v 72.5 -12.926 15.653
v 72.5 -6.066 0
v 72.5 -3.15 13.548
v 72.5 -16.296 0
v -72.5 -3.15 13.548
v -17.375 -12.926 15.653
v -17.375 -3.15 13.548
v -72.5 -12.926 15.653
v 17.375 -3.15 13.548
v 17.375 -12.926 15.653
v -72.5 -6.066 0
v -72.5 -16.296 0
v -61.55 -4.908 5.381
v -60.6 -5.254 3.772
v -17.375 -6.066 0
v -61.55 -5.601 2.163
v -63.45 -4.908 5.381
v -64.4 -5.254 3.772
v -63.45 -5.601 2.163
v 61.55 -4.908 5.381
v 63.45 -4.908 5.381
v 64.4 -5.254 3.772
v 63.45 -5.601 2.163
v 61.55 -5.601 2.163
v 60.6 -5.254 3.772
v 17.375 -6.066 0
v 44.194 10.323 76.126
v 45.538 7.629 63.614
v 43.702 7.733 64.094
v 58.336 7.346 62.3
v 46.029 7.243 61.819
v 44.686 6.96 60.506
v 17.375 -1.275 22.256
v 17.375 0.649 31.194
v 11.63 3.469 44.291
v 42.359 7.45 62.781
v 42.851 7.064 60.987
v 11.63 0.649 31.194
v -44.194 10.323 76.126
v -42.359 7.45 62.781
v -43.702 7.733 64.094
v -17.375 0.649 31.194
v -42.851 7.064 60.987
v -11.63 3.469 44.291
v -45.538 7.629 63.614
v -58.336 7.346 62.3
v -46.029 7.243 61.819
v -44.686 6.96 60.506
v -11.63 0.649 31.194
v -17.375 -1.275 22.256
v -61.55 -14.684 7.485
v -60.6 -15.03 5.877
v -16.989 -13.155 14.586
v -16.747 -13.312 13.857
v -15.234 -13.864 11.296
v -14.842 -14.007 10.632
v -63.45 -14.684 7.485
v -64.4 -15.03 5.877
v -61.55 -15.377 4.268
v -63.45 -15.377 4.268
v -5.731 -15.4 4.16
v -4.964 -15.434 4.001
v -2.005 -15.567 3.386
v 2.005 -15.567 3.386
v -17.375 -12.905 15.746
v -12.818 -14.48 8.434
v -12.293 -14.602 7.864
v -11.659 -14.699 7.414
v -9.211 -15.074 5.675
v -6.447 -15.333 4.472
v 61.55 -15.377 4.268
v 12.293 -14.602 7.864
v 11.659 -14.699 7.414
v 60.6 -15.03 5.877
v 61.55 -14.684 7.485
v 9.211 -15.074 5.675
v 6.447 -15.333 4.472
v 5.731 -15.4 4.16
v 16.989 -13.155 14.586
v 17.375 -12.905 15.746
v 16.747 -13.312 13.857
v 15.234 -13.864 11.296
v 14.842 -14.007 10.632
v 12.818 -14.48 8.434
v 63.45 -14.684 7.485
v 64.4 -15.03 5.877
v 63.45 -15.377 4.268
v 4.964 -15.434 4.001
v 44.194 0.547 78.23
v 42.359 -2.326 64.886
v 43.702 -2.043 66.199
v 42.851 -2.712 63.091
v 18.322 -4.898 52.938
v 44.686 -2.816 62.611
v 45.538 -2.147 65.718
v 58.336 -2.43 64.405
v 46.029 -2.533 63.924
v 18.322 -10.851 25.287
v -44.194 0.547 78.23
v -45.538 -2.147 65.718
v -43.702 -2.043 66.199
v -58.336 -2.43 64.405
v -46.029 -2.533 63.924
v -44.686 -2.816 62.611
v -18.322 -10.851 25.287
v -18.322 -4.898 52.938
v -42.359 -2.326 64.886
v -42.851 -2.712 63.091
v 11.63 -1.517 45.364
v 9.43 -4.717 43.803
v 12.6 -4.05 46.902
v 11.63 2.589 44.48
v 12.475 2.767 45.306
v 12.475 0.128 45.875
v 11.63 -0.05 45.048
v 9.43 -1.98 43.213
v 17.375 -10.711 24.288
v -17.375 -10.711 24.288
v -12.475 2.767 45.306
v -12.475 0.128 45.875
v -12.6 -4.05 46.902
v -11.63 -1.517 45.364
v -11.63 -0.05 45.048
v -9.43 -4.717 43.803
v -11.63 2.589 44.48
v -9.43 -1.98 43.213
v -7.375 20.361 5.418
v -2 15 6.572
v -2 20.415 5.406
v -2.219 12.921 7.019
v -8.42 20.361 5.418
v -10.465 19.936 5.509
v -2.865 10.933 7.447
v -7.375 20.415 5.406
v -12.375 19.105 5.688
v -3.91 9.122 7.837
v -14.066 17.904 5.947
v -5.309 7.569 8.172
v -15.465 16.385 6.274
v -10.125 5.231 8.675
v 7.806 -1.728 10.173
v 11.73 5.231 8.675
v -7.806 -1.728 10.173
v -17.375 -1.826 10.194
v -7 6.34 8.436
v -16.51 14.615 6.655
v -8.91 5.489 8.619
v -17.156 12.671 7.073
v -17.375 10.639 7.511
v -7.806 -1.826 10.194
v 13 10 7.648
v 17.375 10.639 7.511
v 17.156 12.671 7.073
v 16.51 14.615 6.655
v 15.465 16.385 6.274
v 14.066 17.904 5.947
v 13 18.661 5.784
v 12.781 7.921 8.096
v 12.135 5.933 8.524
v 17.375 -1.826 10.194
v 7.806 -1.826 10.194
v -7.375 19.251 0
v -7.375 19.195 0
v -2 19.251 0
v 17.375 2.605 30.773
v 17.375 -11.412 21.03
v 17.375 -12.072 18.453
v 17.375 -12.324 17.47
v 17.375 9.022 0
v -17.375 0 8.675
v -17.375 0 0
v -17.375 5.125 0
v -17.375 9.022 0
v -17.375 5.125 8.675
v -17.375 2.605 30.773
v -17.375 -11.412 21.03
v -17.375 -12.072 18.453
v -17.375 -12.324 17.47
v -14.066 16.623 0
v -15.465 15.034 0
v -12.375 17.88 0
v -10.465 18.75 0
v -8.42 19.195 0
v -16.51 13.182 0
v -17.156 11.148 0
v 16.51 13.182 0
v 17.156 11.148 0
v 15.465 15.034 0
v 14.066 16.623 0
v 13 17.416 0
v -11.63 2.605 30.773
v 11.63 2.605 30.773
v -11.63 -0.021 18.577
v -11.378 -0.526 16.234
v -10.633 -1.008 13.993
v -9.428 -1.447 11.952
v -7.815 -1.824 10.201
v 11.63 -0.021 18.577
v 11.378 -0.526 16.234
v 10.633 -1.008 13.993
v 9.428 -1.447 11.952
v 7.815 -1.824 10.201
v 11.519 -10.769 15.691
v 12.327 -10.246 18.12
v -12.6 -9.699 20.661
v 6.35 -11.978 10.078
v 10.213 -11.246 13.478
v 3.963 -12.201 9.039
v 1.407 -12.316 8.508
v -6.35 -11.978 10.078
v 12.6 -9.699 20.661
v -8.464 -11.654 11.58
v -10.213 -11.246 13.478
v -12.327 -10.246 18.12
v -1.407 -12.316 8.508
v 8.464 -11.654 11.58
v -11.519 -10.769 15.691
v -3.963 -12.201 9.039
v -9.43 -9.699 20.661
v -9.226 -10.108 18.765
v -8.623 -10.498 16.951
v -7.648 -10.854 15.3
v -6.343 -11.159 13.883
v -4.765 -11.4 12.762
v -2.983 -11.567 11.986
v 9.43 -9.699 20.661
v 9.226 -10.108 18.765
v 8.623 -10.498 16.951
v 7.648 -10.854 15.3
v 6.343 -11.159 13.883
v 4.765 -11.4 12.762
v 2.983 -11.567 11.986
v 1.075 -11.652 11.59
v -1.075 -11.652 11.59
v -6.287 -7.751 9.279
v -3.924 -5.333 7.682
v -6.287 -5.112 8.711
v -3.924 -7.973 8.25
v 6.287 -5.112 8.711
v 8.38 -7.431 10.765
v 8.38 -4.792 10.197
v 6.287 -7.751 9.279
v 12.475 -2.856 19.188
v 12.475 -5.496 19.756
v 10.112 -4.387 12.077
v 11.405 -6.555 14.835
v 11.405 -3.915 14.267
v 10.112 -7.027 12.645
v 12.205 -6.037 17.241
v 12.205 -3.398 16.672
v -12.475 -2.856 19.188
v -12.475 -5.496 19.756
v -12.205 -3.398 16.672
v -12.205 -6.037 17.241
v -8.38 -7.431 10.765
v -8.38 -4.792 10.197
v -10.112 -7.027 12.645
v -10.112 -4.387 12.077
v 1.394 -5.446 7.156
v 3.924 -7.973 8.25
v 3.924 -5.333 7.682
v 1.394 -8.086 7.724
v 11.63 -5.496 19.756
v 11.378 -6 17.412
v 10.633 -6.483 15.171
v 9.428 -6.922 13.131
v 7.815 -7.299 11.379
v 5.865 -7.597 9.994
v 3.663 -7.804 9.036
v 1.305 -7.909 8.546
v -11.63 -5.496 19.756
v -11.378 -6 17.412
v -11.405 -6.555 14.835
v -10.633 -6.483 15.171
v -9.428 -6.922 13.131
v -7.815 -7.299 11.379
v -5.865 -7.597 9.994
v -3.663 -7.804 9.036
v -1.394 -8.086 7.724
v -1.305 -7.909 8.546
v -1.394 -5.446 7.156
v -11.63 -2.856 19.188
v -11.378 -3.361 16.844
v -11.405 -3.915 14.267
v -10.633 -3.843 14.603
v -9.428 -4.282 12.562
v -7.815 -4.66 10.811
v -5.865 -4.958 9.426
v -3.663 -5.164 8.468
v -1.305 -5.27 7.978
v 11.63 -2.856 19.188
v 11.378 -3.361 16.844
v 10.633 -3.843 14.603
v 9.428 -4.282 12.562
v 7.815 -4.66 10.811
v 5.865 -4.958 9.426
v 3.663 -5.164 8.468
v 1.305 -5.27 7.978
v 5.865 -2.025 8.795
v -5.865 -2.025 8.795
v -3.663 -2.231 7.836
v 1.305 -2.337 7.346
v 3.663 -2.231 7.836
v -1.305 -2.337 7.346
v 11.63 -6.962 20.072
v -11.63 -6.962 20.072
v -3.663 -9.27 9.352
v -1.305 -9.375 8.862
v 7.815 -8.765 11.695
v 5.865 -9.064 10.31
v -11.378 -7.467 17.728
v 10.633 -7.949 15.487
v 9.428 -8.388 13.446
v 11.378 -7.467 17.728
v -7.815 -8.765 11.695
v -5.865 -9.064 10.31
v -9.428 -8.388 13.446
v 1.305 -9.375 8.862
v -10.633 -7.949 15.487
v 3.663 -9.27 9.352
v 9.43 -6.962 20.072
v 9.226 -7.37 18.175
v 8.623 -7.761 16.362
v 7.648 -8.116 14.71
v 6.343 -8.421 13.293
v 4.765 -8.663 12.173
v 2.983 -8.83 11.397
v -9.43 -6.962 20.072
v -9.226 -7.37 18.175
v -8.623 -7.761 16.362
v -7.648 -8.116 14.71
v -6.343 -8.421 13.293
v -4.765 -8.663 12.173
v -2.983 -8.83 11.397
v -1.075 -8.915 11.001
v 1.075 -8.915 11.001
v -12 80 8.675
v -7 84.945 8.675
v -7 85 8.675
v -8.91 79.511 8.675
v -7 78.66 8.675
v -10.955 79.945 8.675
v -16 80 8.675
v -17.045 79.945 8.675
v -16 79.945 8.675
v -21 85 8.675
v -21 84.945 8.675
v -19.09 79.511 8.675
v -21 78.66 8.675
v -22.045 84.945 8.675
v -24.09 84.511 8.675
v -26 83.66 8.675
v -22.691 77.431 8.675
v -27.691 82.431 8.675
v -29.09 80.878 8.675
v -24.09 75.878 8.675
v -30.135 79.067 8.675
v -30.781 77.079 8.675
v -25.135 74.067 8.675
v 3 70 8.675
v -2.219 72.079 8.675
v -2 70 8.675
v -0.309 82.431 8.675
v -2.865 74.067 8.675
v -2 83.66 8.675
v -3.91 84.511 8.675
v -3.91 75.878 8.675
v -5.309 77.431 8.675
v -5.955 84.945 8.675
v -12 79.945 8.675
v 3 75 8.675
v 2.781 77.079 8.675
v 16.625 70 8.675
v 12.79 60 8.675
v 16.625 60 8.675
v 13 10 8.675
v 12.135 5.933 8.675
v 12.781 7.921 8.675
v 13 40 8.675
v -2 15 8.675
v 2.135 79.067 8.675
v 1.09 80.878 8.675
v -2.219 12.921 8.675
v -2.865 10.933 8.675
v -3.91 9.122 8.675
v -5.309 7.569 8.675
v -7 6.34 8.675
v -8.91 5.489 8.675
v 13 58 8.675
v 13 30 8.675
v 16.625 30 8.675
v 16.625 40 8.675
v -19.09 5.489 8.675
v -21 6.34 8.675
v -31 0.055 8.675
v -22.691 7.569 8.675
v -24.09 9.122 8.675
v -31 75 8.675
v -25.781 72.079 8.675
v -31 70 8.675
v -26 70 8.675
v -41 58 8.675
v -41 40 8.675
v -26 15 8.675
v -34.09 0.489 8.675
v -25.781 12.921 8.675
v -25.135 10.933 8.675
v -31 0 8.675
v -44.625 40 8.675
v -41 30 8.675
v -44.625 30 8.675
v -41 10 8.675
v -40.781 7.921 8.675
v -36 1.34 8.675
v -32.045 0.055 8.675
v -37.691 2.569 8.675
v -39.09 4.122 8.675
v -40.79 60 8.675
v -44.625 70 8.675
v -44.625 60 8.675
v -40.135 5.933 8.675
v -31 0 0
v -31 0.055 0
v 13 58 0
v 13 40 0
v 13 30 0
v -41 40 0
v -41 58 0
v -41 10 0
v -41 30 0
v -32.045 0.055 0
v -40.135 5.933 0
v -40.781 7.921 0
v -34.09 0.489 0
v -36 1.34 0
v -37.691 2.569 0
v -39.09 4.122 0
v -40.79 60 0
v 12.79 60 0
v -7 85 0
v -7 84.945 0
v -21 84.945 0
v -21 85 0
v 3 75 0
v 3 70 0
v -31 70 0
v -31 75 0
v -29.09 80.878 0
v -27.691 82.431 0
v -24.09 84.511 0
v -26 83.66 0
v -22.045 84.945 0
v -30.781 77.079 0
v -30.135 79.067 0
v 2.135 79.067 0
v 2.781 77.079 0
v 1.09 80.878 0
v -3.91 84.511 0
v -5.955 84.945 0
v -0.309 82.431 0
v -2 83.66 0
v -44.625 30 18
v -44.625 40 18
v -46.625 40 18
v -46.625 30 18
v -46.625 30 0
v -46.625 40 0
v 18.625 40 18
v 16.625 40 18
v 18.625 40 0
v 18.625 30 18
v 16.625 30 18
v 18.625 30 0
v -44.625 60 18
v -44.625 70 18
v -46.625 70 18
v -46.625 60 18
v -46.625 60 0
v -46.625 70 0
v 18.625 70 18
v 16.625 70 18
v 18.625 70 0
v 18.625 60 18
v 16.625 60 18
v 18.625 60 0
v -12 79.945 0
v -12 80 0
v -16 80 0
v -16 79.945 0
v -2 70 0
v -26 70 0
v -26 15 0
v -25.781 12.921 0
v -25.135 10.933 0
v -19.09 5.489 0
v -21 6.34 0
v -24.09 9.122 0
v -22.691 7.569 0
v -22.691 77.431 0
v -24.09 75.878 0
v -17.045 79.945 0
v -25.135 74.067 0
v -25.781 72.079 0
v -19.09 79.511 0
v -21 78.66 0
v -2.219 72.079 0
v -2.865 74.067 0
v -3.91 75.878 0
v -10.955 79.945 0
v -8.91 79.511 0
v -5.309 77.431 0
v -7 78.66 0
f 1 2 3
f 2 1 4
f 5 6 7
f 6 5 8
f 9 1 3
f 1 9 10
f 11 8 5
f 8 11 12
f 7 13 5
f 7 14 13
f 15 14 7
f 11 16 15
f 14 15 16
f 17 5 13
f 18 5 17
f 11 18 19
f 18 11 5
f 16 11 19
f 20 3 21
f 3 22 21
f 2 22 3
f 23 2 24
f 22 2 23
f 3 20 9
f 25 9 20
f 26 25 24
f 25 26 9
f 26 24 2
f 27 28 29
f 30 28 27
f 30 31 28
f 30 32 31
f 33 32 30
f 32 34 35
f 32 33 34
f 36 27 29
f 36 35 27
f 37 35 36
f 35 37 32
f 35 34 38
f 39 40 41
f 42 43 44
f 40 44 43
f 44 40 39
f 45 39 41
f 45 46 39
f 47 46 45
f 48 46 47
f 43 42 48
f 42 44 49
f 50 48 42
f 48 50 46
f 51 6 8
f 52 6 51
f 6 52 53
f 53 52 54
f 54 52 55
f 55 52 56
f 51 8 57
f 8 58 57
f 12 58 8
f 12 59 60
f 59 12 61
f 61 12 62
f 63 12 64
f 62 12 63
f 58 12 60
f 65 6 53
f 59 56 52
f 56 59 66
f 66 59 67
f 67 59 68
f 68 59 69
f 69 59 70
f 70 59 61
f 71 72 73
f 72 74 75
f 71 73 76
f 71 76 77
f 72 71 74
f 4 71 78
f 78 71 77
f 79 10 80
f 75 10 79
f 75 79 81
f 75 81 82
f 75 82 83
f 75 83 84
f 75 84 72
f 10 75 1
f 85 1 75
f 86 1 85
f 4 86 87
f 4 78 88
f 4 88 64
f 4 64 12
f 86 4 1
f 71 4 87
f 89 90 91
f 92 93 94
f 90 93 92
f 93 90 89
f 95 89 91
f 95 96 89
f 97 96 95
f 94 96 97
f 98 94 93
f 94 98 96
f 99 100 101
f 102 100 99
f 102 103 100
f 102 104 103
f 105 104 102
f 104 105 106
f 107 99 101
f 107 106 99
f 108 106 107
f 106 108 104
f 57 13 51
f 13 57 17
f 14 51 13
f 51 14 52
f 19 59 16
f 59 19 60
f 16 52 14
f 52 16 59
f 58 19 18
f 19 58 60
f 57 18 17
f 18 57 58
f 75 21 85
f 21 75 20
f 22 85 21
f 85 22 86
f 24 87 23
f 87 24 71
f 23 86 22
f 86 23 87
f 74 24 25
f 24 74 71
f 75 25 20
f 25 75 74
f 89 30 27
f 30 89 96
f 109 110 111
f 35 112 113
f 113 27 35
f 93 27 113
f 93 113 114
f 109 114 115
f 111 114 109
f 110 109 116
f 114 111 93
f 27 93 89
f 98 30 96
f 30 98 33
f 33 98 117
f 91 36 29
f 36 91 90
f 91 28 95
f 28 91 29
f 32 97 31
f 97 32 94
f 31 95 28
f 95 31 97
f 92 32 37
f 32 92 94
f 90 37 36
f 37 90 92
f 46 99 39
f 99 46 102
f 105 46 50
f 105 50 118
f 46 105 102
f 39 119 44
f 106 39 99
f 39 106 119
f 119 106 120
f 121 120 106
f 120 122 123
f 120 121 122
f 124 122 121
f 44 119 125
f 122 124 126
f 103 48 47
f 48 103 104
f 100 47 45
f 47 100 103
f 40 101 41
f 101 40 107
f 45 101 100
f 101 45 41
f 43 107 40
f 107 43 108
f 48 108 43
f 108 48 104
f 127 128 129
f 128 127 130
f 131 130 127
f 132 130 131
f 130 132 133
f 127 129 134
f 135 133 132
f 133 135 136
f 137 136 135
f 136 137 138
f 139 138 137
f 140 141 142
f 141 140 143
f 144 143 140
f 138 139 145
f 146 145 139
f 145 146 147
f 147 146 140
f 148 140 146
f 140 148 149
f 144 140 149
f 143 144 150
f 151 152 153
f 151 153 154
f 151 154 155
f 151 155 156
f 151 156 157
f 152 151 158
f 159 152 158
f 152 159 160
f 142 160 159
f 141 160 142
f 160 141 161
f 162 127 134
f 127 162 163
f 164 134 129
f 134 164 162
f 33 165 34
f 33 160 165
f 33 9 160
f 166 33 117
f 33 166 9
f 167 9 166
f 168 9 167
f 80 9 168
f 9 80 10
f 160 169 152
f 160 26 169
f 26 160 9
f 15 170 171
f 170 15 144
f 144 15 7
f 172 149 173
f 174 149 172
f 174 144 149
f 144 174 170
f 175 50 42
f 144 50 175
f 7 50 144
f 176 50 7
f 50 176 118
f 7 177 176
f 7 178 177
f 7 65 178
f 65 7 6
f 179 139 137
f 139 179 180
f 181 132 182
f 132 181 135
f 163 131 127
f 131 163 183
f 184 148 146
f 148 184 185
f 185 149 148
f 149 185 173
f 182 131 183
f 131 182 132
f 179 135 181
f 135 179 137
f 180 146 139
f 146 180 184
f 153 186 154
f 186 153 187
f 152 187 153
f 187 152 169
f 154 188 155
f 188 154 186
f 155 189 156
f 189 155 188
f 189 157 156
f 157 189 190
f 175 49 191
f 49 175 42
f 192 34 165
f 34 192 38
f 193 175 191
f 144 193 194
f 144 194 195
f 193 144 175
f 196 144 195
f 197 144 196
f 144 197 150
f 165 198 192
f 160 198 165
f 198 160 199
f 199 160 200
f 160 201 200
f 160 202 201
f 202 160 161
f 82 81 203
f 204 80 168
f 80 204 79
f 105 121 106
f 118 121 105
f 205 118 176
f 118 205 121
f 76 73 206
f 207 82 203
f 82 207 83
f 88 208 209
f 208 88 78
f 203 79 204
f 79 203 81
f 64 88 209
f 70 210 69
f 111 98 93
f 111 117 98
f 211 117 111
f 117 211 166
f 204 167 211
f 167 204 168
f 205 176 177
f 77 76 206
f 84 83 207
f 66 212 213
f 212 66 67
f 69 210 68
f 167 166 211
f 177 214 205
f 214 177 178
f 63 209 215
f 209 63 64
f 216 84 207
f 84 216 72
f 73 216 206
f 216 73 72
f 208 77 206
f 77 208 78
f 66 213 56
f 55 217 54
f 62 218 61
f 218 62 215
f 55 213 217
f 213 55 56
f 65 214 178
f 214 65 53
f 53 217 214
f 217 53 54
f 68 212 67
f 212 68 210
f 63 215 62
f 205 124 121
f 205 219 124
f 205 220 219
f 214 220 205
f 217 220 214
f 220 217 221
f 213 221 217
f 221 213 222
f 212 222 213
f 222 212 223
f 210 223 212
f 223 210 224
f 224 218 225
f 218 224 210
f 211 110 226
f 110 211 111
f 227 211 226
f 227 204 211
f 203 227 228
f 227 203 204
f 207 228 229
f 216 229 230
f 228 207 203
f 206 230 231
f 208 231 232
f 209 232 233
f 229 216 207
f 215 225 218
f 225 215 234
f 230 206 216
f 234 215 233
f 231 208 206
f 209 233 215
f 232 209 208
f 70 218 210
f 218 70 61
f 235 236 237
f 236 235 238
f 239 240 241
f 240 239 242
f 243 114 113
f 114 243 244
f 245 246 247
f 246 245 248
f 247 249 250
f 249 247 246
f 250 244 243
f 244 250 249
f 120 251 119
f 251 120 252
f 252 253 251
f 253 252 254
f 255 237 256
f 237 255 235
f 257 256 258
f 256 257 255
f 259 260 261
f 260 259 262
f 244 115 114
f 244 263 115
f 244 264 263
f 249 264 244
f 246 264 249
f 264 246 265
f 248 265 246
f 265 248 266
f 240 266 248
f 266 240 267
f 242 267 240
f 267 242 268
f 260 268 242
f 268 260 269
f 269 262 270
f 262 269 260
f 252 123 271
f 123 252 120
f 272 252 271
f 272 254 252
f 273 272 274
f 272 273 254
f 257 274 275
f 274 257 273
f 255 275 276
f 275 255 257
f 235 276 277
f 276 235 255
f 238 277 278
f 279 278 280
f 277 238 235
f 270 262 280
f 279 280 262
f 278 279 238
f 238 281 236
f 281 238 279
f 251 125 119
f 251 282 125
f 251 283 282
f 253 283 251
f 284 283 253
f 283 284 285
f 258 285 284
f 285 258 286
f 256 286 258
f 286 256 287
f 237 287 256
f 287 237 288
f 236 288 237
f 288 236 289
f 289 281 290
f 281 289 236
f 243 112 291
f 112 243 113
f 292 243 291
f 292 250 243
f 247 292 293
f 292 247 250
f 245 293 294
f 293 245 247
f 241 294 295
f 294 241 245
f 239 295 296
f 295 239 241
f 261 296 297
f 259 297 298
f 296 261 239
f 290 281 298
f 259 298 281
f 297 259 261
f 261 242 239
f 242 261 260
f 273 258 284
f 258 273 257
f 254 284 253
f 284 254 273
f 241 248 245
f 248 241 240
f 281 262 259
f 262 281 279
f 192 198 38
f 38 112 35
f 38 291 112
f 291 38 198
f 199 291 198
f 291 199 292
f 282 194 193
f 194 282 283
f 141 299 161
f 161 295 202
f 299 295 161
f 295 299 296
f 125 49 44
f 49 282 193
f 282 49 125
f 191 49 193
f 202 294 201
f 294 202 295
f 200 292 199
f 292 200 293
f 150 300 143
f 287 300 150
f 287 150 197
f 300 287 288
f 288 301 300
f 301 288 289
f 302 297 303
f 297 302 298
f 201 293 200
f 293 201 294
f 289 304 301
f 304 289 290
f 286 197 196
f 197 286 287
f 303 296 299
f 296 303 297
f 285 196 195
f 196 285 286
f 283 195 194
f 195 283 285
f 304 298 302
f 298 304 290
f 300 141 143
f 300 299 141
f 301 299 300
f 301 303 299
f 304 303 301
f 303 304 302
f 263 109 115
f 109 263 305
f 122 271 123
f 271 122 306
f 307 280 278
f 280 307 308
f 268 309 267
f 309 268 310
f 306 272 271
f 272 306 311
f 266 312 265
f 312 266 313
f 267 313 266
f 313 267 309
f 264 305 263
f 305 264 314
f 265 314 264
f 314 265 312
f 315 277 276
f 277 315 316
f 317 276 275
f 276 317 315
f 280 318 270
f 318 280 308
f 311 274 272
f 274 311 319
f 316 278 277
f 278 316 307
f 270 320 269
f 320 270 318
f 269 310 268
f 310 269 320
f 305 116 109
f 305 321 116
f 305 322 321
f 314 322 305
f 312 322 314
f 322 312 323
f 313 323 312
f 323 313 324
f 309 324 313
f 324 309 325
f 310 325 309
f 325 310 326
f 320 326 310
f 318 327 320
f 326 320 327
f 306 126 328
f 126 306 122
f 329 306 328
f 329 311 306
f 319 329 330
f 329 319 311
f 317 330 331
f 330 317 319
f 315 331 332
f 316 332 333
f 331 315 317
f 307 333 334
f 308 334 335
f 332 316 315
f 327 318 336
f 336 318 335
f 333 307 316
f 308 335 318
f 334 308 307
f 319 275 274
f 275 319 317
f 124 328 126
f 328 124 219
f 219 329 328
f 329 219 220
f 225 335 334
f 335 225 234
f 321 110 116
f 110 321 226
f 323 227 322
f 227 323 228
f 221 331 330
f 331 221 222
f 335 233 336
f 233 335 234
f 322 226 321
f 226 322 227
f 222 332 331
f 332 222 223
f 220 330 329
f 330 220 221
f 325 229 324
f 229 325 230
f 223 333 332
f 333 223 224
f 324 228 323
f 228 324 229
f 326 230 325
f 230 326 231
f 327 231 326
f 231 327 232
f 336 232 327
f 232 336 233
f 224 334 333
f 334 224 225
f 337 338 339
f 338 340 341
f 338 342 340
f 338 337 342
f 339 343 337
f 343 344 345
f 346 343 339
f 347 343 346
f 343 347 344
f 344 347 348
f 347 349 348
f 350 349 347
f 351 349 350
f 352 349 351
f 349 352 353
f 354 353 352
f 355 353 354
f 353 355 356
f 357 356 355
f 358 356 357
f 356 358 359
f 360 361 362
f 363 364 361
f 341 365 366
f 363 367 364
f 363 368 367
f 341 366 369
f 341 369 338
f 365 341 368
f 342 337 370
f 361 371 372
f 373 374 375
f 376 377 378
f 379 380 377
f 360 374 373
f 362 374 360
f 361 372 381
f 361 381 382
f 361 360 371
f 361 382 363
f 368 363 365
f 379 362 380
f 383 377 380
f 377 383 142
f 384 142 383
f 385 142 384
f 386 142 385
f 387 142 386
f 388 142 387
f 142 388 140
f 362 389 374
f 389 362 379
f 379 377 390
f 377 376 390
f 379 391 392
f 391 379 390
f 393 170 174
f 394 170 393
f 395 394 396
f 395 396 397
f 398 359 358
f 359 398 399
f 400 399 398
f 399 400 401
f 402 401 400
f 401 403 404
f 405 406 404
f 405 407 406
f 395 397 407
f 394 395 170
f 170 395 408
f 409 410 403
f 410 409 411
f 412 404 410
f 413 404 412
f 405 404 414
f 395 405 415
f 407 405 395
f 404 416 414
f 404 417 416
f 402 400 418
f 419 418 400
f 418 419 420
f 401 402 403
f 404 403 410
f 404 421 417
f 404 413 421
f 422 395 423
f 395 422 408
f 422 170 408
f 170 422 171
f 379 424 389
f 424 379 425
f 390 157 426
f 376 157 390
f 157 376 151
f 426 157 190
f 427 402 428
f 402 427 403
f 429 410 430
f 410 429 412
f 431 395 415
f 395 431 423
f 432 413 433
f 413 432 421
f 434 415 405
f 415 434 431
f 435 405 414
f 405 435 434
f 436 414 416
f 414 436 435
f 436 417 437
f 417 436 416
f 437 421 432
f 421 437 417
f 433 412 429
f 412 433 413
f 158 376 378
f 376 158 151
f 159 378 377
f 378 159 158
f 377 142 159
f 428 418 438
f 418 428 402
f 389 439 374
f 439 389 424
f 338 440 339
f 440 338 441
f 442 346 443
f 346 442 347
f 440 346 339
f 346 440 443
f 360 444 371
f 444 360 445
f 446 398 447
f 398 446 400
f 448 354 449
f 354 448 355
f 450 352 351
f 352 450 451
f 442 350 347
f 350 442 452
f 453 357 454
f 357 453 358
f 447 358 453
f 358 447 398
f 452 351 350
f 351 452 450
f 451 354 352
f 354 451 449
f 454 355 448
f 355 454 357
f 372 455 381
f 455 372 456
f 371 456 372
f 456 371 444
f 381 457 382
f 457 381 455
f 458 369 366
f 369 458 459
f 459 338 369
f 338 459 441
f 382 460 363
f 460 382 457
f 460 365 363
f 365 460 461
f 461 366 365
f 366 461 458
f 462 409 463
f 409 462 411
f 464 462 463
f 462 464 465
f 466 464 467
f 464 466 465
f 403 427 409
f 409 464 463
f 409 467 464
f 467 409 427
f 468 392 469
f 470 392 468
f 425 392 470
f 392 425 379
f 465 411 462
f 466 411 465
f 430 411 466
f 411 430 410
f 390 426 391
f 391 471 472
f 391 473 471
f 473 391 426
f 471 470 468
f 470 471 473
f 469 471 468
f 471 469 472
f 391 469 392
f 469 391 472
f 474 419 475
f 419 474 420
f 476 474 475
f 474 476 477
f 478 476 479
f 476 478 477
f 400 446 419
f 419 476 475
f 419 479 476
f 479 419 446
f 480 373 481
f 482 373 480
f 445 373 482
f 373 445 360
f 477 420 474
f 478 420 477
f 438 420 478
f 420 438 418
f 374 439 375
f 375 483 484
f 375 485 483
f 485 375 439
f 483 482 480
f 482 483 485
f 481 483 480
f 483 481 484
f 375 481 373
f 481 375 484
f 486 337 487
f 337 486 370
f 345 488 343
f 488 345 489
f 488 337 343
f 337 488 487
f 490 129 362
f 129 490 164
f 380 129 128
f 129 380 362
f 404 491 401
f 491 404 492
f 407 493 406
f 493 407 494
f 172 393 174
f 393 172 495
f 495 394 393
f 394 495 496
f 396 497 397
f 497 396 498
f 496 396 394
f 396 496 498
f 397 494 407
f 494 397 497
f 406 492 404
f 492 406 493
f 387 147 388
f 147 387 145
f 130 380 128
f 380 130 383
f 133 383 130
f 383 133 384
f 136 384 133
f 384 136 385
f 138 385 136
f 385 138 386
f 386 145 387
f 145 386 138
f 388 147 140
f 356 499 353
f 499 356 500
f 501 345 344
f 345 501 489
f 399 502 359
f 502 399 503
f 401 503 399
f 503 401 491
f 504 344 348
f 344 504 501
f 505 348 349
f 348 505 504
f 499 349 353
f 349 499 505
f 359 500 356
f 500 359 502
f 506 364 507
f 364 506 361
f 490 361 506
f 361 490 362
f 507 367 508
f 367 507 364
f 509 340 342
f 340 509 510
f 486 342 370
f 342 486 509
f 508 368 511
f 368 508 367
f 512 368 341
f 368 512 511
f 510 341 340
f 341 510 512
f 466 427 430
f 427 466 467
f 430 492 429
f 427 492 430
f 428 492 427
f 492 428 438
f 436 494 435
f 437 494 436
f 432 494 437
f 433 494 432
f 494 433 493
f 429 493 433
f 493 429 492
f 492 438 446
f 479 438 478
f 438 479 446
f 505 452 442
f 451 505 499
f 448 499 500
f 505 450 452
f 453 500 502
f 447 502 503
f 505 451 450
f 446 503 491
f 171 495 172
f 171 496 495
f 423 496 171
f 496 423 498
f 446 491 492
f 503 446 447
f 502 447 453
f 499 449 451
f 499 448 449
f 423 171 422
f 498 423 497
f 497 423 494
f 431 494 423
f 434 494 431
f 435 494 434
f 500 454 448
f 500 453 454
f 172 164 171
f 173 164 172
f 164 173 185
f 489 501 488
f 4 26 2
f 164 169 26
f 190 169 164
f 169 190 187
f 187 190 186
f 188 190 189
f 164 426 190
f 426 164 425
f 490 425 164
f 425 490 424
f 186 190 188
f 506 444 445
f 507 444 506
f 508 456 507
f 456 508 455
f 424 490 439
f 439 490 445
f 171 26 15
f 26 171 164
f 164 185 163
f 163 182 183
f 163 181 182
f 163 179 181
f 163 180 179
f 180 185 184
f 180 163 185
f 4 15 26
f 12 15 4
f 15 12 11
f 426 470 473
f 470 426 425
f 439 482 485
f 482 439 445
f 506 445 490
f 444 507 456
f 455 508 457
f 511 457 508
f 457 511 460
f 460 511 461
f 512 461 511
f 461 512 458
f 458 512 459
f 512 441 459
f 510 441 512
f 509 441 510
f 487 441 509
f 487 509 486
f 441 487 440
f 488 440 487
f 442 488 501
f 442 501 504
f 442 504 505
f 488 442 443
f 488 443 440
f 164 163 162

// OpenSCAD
opteka_r1 = 24.75/2;
opteka_r2 = 41.35/2;

module rounded(size, r) {
    union() {
        translate([r, 0, 0]) cube([size[0]-2*r, size[1], size[2]]);
        translate([0, r, 0]) cube([size[0], size[1]-2*r, size[2]]);
        translate([r, r, 0]) cylinder(h=size[2], r=r);
        translate([size[0]-r, r, 0]) cylinder(h=size[2], r=r);
        translate([r, size[1]-r, 0]) cylinder(h=size[2], r=r);
        translate([size[0]-r, size[1]-r, 0]) cylinder(h=size[2], r=r);
    }
}

module opteka() {
    union() {
        cylinder(r=23.06/2, h=7);
        translate([0, 0, 3]) cylinder(r=opteka_r1, h=2.5);
        cylinder(r=18.66/2, h=10);
        translate([0, 0, 10]) cylinder(r1=25/2, r2=opteka_r2, h=3);
        translate([0, 0, 13]) cylinder(r=opteka_r2, h=8.42);
    }
}

margin = 0.1;
angle = -12.15;
wall = 5;
wall2 = 2;
image_h = 10;

showwx_offset = 14;
showwx_w = 61.25;
showwx_wb = 54;
showwx_wb2 = 34;
showwx_l1 = 68;
showwx_l2 = 85;

globe_r1 = 98/2;
globe_r2 = 105/2;
globe_h = 15;
globe_bolt = 3.8/2;

module lens_mount() difference() {
    translate([0, 0, -2]) union() {
        translate([0, 0, opteka_r2]) rotate([angle, 0, 0]) difference() {
            union() {
                difference() {
                    translate([-globe_r2-4*wall, -12, -opteka_r2-wall]) cube([2*(globe_r2+4*wall), 2*wall, 4*wall]);
                    translate([-globe_r2-2*wall, -12, -opteka_r2+wall]) rotate([-90, 0, 0]) cylinder(r=globe_bolt, h=20);
                    translate([globe_r2+2*wall, -12, -opteka_r2+wall]) rotate([-90, 0, 0]) cylinder(r=globe_bolt, h=20);
                }
                for(t = [-45, -135]) {
                    rotate([0, t, 0]) translate([0, -12, -2*wall]) difference() {
                        cube([globe_r2+4*wall, 2*wall, 4*wall]);
                        translate([globe_r2+2*wall, 0, 2*wall]) rotate([-90, 0, 0]) cylinder(r=globe_bolt, h=globe_h);
                    }
                }
                translate([-opteka_r1-wall, -12, -opteka_r2-wall]) union() {
                    cube([2*(opteka_r1+wall), 12, (opteka_r2+wall+opteka_r1)]);
                    rounded([2*(opteka_r1+wall), 2*(opteka_r1+wall), 17], 10);
                }
            }
            minkowski() {
                rotate([90, 0, 0]) opteka();
                translate([-margin, -margin, -margin]) cube([margin*2, margin*2, 50+margin]);
            }
        }
        
        
        translate([-showwx_offset, 0, 0]) difference() {
            union() {
                translate([-showwx_wb/2, 0, 0]) rounded([showwx_wb, showwx_l1, opteka_r2-image_h], 10);
                translate([-showwx_wb2/2, 0, 0]) rounded([showwx_wb2, showwx_l2, opteka_r2-image_h], 10);
                for(y = [30, 60]) {
                    union() {
                        translate([-showwx_w/2-wall2, y, 0]) cube([wall2, 10, 20]);
                        translate([showwx_w/2, y, 0]) cube([wall2, 10, 20]);
                        translate([-showwx_w/2, y, 0]) cube([showwx_w, 10, opteka_r2-image_h]);
                    }
                }
            }
            translate([-showwx_wb2/2+wall, wall, 0]) rounded([showwx_wb2-2*wall, showwx_l2-2*wall, 50], 10);
        }
    }
    
    translate([-200, -200, -100]) cube([400, 400, 100]);
}

module globe_mount() {
    difference() {
        union() {
            cylinder(r1=globe_r2+wall, r2=globe_r1+wall, h=globe_h);
            translate([-globe_r2-4*wall, -opteka_r2-wall, 0]) difference() {
                rounded([2*(globe_r2+4*wall), 4*wall, wall],2);
                translate([2*wall, 2*wall, 0]) cylinder(r=globe_bolt, h=globe_h);
                translate([2*globe_r2+6*wall, 2*wall, 0]) cylinder(r=globe_bolt, h=globe_h);
            }
            for(t = [45, 135]) {
                rotate([0, 0, t]) translate([0, -2*wall, 0]) difference() {
                    rounded([globe_r2+4*wall, 4*wall, wall], 2);
                    translate([globe_r2+2*wall, 2*wall, 0]) cylinder(r=globe_bolt, h=globe_h);
                }
            }
            for(i = [0:11]) {
                rotate([0, 0, i*360/12]) translate([-globe_r2-wall, -wall, 0]) cube([20, 2*wall, globe_h/2+wall]);
            }
        }
        cylinder(r1=globe_r2, r2=globe_r1, h=globe_h-wall);
        cylinder(r=globe_r1, h=globe_h+1);
        translate([-wall, -globe_r2-2*wall, 0]) cube([2*wall, 2*(globe_r2+2*wall), globe_h+1]);
        for(i = [0:11]) {
            rotate([0, 0, i*360/12]) translate([-globe_r2-wall, 0, globe_h/2]) rotate([0, 90, 0]) cylinder(r=globe_bolt, h=20);
        }
    }
}

lens_mount();

//globe_mount();
